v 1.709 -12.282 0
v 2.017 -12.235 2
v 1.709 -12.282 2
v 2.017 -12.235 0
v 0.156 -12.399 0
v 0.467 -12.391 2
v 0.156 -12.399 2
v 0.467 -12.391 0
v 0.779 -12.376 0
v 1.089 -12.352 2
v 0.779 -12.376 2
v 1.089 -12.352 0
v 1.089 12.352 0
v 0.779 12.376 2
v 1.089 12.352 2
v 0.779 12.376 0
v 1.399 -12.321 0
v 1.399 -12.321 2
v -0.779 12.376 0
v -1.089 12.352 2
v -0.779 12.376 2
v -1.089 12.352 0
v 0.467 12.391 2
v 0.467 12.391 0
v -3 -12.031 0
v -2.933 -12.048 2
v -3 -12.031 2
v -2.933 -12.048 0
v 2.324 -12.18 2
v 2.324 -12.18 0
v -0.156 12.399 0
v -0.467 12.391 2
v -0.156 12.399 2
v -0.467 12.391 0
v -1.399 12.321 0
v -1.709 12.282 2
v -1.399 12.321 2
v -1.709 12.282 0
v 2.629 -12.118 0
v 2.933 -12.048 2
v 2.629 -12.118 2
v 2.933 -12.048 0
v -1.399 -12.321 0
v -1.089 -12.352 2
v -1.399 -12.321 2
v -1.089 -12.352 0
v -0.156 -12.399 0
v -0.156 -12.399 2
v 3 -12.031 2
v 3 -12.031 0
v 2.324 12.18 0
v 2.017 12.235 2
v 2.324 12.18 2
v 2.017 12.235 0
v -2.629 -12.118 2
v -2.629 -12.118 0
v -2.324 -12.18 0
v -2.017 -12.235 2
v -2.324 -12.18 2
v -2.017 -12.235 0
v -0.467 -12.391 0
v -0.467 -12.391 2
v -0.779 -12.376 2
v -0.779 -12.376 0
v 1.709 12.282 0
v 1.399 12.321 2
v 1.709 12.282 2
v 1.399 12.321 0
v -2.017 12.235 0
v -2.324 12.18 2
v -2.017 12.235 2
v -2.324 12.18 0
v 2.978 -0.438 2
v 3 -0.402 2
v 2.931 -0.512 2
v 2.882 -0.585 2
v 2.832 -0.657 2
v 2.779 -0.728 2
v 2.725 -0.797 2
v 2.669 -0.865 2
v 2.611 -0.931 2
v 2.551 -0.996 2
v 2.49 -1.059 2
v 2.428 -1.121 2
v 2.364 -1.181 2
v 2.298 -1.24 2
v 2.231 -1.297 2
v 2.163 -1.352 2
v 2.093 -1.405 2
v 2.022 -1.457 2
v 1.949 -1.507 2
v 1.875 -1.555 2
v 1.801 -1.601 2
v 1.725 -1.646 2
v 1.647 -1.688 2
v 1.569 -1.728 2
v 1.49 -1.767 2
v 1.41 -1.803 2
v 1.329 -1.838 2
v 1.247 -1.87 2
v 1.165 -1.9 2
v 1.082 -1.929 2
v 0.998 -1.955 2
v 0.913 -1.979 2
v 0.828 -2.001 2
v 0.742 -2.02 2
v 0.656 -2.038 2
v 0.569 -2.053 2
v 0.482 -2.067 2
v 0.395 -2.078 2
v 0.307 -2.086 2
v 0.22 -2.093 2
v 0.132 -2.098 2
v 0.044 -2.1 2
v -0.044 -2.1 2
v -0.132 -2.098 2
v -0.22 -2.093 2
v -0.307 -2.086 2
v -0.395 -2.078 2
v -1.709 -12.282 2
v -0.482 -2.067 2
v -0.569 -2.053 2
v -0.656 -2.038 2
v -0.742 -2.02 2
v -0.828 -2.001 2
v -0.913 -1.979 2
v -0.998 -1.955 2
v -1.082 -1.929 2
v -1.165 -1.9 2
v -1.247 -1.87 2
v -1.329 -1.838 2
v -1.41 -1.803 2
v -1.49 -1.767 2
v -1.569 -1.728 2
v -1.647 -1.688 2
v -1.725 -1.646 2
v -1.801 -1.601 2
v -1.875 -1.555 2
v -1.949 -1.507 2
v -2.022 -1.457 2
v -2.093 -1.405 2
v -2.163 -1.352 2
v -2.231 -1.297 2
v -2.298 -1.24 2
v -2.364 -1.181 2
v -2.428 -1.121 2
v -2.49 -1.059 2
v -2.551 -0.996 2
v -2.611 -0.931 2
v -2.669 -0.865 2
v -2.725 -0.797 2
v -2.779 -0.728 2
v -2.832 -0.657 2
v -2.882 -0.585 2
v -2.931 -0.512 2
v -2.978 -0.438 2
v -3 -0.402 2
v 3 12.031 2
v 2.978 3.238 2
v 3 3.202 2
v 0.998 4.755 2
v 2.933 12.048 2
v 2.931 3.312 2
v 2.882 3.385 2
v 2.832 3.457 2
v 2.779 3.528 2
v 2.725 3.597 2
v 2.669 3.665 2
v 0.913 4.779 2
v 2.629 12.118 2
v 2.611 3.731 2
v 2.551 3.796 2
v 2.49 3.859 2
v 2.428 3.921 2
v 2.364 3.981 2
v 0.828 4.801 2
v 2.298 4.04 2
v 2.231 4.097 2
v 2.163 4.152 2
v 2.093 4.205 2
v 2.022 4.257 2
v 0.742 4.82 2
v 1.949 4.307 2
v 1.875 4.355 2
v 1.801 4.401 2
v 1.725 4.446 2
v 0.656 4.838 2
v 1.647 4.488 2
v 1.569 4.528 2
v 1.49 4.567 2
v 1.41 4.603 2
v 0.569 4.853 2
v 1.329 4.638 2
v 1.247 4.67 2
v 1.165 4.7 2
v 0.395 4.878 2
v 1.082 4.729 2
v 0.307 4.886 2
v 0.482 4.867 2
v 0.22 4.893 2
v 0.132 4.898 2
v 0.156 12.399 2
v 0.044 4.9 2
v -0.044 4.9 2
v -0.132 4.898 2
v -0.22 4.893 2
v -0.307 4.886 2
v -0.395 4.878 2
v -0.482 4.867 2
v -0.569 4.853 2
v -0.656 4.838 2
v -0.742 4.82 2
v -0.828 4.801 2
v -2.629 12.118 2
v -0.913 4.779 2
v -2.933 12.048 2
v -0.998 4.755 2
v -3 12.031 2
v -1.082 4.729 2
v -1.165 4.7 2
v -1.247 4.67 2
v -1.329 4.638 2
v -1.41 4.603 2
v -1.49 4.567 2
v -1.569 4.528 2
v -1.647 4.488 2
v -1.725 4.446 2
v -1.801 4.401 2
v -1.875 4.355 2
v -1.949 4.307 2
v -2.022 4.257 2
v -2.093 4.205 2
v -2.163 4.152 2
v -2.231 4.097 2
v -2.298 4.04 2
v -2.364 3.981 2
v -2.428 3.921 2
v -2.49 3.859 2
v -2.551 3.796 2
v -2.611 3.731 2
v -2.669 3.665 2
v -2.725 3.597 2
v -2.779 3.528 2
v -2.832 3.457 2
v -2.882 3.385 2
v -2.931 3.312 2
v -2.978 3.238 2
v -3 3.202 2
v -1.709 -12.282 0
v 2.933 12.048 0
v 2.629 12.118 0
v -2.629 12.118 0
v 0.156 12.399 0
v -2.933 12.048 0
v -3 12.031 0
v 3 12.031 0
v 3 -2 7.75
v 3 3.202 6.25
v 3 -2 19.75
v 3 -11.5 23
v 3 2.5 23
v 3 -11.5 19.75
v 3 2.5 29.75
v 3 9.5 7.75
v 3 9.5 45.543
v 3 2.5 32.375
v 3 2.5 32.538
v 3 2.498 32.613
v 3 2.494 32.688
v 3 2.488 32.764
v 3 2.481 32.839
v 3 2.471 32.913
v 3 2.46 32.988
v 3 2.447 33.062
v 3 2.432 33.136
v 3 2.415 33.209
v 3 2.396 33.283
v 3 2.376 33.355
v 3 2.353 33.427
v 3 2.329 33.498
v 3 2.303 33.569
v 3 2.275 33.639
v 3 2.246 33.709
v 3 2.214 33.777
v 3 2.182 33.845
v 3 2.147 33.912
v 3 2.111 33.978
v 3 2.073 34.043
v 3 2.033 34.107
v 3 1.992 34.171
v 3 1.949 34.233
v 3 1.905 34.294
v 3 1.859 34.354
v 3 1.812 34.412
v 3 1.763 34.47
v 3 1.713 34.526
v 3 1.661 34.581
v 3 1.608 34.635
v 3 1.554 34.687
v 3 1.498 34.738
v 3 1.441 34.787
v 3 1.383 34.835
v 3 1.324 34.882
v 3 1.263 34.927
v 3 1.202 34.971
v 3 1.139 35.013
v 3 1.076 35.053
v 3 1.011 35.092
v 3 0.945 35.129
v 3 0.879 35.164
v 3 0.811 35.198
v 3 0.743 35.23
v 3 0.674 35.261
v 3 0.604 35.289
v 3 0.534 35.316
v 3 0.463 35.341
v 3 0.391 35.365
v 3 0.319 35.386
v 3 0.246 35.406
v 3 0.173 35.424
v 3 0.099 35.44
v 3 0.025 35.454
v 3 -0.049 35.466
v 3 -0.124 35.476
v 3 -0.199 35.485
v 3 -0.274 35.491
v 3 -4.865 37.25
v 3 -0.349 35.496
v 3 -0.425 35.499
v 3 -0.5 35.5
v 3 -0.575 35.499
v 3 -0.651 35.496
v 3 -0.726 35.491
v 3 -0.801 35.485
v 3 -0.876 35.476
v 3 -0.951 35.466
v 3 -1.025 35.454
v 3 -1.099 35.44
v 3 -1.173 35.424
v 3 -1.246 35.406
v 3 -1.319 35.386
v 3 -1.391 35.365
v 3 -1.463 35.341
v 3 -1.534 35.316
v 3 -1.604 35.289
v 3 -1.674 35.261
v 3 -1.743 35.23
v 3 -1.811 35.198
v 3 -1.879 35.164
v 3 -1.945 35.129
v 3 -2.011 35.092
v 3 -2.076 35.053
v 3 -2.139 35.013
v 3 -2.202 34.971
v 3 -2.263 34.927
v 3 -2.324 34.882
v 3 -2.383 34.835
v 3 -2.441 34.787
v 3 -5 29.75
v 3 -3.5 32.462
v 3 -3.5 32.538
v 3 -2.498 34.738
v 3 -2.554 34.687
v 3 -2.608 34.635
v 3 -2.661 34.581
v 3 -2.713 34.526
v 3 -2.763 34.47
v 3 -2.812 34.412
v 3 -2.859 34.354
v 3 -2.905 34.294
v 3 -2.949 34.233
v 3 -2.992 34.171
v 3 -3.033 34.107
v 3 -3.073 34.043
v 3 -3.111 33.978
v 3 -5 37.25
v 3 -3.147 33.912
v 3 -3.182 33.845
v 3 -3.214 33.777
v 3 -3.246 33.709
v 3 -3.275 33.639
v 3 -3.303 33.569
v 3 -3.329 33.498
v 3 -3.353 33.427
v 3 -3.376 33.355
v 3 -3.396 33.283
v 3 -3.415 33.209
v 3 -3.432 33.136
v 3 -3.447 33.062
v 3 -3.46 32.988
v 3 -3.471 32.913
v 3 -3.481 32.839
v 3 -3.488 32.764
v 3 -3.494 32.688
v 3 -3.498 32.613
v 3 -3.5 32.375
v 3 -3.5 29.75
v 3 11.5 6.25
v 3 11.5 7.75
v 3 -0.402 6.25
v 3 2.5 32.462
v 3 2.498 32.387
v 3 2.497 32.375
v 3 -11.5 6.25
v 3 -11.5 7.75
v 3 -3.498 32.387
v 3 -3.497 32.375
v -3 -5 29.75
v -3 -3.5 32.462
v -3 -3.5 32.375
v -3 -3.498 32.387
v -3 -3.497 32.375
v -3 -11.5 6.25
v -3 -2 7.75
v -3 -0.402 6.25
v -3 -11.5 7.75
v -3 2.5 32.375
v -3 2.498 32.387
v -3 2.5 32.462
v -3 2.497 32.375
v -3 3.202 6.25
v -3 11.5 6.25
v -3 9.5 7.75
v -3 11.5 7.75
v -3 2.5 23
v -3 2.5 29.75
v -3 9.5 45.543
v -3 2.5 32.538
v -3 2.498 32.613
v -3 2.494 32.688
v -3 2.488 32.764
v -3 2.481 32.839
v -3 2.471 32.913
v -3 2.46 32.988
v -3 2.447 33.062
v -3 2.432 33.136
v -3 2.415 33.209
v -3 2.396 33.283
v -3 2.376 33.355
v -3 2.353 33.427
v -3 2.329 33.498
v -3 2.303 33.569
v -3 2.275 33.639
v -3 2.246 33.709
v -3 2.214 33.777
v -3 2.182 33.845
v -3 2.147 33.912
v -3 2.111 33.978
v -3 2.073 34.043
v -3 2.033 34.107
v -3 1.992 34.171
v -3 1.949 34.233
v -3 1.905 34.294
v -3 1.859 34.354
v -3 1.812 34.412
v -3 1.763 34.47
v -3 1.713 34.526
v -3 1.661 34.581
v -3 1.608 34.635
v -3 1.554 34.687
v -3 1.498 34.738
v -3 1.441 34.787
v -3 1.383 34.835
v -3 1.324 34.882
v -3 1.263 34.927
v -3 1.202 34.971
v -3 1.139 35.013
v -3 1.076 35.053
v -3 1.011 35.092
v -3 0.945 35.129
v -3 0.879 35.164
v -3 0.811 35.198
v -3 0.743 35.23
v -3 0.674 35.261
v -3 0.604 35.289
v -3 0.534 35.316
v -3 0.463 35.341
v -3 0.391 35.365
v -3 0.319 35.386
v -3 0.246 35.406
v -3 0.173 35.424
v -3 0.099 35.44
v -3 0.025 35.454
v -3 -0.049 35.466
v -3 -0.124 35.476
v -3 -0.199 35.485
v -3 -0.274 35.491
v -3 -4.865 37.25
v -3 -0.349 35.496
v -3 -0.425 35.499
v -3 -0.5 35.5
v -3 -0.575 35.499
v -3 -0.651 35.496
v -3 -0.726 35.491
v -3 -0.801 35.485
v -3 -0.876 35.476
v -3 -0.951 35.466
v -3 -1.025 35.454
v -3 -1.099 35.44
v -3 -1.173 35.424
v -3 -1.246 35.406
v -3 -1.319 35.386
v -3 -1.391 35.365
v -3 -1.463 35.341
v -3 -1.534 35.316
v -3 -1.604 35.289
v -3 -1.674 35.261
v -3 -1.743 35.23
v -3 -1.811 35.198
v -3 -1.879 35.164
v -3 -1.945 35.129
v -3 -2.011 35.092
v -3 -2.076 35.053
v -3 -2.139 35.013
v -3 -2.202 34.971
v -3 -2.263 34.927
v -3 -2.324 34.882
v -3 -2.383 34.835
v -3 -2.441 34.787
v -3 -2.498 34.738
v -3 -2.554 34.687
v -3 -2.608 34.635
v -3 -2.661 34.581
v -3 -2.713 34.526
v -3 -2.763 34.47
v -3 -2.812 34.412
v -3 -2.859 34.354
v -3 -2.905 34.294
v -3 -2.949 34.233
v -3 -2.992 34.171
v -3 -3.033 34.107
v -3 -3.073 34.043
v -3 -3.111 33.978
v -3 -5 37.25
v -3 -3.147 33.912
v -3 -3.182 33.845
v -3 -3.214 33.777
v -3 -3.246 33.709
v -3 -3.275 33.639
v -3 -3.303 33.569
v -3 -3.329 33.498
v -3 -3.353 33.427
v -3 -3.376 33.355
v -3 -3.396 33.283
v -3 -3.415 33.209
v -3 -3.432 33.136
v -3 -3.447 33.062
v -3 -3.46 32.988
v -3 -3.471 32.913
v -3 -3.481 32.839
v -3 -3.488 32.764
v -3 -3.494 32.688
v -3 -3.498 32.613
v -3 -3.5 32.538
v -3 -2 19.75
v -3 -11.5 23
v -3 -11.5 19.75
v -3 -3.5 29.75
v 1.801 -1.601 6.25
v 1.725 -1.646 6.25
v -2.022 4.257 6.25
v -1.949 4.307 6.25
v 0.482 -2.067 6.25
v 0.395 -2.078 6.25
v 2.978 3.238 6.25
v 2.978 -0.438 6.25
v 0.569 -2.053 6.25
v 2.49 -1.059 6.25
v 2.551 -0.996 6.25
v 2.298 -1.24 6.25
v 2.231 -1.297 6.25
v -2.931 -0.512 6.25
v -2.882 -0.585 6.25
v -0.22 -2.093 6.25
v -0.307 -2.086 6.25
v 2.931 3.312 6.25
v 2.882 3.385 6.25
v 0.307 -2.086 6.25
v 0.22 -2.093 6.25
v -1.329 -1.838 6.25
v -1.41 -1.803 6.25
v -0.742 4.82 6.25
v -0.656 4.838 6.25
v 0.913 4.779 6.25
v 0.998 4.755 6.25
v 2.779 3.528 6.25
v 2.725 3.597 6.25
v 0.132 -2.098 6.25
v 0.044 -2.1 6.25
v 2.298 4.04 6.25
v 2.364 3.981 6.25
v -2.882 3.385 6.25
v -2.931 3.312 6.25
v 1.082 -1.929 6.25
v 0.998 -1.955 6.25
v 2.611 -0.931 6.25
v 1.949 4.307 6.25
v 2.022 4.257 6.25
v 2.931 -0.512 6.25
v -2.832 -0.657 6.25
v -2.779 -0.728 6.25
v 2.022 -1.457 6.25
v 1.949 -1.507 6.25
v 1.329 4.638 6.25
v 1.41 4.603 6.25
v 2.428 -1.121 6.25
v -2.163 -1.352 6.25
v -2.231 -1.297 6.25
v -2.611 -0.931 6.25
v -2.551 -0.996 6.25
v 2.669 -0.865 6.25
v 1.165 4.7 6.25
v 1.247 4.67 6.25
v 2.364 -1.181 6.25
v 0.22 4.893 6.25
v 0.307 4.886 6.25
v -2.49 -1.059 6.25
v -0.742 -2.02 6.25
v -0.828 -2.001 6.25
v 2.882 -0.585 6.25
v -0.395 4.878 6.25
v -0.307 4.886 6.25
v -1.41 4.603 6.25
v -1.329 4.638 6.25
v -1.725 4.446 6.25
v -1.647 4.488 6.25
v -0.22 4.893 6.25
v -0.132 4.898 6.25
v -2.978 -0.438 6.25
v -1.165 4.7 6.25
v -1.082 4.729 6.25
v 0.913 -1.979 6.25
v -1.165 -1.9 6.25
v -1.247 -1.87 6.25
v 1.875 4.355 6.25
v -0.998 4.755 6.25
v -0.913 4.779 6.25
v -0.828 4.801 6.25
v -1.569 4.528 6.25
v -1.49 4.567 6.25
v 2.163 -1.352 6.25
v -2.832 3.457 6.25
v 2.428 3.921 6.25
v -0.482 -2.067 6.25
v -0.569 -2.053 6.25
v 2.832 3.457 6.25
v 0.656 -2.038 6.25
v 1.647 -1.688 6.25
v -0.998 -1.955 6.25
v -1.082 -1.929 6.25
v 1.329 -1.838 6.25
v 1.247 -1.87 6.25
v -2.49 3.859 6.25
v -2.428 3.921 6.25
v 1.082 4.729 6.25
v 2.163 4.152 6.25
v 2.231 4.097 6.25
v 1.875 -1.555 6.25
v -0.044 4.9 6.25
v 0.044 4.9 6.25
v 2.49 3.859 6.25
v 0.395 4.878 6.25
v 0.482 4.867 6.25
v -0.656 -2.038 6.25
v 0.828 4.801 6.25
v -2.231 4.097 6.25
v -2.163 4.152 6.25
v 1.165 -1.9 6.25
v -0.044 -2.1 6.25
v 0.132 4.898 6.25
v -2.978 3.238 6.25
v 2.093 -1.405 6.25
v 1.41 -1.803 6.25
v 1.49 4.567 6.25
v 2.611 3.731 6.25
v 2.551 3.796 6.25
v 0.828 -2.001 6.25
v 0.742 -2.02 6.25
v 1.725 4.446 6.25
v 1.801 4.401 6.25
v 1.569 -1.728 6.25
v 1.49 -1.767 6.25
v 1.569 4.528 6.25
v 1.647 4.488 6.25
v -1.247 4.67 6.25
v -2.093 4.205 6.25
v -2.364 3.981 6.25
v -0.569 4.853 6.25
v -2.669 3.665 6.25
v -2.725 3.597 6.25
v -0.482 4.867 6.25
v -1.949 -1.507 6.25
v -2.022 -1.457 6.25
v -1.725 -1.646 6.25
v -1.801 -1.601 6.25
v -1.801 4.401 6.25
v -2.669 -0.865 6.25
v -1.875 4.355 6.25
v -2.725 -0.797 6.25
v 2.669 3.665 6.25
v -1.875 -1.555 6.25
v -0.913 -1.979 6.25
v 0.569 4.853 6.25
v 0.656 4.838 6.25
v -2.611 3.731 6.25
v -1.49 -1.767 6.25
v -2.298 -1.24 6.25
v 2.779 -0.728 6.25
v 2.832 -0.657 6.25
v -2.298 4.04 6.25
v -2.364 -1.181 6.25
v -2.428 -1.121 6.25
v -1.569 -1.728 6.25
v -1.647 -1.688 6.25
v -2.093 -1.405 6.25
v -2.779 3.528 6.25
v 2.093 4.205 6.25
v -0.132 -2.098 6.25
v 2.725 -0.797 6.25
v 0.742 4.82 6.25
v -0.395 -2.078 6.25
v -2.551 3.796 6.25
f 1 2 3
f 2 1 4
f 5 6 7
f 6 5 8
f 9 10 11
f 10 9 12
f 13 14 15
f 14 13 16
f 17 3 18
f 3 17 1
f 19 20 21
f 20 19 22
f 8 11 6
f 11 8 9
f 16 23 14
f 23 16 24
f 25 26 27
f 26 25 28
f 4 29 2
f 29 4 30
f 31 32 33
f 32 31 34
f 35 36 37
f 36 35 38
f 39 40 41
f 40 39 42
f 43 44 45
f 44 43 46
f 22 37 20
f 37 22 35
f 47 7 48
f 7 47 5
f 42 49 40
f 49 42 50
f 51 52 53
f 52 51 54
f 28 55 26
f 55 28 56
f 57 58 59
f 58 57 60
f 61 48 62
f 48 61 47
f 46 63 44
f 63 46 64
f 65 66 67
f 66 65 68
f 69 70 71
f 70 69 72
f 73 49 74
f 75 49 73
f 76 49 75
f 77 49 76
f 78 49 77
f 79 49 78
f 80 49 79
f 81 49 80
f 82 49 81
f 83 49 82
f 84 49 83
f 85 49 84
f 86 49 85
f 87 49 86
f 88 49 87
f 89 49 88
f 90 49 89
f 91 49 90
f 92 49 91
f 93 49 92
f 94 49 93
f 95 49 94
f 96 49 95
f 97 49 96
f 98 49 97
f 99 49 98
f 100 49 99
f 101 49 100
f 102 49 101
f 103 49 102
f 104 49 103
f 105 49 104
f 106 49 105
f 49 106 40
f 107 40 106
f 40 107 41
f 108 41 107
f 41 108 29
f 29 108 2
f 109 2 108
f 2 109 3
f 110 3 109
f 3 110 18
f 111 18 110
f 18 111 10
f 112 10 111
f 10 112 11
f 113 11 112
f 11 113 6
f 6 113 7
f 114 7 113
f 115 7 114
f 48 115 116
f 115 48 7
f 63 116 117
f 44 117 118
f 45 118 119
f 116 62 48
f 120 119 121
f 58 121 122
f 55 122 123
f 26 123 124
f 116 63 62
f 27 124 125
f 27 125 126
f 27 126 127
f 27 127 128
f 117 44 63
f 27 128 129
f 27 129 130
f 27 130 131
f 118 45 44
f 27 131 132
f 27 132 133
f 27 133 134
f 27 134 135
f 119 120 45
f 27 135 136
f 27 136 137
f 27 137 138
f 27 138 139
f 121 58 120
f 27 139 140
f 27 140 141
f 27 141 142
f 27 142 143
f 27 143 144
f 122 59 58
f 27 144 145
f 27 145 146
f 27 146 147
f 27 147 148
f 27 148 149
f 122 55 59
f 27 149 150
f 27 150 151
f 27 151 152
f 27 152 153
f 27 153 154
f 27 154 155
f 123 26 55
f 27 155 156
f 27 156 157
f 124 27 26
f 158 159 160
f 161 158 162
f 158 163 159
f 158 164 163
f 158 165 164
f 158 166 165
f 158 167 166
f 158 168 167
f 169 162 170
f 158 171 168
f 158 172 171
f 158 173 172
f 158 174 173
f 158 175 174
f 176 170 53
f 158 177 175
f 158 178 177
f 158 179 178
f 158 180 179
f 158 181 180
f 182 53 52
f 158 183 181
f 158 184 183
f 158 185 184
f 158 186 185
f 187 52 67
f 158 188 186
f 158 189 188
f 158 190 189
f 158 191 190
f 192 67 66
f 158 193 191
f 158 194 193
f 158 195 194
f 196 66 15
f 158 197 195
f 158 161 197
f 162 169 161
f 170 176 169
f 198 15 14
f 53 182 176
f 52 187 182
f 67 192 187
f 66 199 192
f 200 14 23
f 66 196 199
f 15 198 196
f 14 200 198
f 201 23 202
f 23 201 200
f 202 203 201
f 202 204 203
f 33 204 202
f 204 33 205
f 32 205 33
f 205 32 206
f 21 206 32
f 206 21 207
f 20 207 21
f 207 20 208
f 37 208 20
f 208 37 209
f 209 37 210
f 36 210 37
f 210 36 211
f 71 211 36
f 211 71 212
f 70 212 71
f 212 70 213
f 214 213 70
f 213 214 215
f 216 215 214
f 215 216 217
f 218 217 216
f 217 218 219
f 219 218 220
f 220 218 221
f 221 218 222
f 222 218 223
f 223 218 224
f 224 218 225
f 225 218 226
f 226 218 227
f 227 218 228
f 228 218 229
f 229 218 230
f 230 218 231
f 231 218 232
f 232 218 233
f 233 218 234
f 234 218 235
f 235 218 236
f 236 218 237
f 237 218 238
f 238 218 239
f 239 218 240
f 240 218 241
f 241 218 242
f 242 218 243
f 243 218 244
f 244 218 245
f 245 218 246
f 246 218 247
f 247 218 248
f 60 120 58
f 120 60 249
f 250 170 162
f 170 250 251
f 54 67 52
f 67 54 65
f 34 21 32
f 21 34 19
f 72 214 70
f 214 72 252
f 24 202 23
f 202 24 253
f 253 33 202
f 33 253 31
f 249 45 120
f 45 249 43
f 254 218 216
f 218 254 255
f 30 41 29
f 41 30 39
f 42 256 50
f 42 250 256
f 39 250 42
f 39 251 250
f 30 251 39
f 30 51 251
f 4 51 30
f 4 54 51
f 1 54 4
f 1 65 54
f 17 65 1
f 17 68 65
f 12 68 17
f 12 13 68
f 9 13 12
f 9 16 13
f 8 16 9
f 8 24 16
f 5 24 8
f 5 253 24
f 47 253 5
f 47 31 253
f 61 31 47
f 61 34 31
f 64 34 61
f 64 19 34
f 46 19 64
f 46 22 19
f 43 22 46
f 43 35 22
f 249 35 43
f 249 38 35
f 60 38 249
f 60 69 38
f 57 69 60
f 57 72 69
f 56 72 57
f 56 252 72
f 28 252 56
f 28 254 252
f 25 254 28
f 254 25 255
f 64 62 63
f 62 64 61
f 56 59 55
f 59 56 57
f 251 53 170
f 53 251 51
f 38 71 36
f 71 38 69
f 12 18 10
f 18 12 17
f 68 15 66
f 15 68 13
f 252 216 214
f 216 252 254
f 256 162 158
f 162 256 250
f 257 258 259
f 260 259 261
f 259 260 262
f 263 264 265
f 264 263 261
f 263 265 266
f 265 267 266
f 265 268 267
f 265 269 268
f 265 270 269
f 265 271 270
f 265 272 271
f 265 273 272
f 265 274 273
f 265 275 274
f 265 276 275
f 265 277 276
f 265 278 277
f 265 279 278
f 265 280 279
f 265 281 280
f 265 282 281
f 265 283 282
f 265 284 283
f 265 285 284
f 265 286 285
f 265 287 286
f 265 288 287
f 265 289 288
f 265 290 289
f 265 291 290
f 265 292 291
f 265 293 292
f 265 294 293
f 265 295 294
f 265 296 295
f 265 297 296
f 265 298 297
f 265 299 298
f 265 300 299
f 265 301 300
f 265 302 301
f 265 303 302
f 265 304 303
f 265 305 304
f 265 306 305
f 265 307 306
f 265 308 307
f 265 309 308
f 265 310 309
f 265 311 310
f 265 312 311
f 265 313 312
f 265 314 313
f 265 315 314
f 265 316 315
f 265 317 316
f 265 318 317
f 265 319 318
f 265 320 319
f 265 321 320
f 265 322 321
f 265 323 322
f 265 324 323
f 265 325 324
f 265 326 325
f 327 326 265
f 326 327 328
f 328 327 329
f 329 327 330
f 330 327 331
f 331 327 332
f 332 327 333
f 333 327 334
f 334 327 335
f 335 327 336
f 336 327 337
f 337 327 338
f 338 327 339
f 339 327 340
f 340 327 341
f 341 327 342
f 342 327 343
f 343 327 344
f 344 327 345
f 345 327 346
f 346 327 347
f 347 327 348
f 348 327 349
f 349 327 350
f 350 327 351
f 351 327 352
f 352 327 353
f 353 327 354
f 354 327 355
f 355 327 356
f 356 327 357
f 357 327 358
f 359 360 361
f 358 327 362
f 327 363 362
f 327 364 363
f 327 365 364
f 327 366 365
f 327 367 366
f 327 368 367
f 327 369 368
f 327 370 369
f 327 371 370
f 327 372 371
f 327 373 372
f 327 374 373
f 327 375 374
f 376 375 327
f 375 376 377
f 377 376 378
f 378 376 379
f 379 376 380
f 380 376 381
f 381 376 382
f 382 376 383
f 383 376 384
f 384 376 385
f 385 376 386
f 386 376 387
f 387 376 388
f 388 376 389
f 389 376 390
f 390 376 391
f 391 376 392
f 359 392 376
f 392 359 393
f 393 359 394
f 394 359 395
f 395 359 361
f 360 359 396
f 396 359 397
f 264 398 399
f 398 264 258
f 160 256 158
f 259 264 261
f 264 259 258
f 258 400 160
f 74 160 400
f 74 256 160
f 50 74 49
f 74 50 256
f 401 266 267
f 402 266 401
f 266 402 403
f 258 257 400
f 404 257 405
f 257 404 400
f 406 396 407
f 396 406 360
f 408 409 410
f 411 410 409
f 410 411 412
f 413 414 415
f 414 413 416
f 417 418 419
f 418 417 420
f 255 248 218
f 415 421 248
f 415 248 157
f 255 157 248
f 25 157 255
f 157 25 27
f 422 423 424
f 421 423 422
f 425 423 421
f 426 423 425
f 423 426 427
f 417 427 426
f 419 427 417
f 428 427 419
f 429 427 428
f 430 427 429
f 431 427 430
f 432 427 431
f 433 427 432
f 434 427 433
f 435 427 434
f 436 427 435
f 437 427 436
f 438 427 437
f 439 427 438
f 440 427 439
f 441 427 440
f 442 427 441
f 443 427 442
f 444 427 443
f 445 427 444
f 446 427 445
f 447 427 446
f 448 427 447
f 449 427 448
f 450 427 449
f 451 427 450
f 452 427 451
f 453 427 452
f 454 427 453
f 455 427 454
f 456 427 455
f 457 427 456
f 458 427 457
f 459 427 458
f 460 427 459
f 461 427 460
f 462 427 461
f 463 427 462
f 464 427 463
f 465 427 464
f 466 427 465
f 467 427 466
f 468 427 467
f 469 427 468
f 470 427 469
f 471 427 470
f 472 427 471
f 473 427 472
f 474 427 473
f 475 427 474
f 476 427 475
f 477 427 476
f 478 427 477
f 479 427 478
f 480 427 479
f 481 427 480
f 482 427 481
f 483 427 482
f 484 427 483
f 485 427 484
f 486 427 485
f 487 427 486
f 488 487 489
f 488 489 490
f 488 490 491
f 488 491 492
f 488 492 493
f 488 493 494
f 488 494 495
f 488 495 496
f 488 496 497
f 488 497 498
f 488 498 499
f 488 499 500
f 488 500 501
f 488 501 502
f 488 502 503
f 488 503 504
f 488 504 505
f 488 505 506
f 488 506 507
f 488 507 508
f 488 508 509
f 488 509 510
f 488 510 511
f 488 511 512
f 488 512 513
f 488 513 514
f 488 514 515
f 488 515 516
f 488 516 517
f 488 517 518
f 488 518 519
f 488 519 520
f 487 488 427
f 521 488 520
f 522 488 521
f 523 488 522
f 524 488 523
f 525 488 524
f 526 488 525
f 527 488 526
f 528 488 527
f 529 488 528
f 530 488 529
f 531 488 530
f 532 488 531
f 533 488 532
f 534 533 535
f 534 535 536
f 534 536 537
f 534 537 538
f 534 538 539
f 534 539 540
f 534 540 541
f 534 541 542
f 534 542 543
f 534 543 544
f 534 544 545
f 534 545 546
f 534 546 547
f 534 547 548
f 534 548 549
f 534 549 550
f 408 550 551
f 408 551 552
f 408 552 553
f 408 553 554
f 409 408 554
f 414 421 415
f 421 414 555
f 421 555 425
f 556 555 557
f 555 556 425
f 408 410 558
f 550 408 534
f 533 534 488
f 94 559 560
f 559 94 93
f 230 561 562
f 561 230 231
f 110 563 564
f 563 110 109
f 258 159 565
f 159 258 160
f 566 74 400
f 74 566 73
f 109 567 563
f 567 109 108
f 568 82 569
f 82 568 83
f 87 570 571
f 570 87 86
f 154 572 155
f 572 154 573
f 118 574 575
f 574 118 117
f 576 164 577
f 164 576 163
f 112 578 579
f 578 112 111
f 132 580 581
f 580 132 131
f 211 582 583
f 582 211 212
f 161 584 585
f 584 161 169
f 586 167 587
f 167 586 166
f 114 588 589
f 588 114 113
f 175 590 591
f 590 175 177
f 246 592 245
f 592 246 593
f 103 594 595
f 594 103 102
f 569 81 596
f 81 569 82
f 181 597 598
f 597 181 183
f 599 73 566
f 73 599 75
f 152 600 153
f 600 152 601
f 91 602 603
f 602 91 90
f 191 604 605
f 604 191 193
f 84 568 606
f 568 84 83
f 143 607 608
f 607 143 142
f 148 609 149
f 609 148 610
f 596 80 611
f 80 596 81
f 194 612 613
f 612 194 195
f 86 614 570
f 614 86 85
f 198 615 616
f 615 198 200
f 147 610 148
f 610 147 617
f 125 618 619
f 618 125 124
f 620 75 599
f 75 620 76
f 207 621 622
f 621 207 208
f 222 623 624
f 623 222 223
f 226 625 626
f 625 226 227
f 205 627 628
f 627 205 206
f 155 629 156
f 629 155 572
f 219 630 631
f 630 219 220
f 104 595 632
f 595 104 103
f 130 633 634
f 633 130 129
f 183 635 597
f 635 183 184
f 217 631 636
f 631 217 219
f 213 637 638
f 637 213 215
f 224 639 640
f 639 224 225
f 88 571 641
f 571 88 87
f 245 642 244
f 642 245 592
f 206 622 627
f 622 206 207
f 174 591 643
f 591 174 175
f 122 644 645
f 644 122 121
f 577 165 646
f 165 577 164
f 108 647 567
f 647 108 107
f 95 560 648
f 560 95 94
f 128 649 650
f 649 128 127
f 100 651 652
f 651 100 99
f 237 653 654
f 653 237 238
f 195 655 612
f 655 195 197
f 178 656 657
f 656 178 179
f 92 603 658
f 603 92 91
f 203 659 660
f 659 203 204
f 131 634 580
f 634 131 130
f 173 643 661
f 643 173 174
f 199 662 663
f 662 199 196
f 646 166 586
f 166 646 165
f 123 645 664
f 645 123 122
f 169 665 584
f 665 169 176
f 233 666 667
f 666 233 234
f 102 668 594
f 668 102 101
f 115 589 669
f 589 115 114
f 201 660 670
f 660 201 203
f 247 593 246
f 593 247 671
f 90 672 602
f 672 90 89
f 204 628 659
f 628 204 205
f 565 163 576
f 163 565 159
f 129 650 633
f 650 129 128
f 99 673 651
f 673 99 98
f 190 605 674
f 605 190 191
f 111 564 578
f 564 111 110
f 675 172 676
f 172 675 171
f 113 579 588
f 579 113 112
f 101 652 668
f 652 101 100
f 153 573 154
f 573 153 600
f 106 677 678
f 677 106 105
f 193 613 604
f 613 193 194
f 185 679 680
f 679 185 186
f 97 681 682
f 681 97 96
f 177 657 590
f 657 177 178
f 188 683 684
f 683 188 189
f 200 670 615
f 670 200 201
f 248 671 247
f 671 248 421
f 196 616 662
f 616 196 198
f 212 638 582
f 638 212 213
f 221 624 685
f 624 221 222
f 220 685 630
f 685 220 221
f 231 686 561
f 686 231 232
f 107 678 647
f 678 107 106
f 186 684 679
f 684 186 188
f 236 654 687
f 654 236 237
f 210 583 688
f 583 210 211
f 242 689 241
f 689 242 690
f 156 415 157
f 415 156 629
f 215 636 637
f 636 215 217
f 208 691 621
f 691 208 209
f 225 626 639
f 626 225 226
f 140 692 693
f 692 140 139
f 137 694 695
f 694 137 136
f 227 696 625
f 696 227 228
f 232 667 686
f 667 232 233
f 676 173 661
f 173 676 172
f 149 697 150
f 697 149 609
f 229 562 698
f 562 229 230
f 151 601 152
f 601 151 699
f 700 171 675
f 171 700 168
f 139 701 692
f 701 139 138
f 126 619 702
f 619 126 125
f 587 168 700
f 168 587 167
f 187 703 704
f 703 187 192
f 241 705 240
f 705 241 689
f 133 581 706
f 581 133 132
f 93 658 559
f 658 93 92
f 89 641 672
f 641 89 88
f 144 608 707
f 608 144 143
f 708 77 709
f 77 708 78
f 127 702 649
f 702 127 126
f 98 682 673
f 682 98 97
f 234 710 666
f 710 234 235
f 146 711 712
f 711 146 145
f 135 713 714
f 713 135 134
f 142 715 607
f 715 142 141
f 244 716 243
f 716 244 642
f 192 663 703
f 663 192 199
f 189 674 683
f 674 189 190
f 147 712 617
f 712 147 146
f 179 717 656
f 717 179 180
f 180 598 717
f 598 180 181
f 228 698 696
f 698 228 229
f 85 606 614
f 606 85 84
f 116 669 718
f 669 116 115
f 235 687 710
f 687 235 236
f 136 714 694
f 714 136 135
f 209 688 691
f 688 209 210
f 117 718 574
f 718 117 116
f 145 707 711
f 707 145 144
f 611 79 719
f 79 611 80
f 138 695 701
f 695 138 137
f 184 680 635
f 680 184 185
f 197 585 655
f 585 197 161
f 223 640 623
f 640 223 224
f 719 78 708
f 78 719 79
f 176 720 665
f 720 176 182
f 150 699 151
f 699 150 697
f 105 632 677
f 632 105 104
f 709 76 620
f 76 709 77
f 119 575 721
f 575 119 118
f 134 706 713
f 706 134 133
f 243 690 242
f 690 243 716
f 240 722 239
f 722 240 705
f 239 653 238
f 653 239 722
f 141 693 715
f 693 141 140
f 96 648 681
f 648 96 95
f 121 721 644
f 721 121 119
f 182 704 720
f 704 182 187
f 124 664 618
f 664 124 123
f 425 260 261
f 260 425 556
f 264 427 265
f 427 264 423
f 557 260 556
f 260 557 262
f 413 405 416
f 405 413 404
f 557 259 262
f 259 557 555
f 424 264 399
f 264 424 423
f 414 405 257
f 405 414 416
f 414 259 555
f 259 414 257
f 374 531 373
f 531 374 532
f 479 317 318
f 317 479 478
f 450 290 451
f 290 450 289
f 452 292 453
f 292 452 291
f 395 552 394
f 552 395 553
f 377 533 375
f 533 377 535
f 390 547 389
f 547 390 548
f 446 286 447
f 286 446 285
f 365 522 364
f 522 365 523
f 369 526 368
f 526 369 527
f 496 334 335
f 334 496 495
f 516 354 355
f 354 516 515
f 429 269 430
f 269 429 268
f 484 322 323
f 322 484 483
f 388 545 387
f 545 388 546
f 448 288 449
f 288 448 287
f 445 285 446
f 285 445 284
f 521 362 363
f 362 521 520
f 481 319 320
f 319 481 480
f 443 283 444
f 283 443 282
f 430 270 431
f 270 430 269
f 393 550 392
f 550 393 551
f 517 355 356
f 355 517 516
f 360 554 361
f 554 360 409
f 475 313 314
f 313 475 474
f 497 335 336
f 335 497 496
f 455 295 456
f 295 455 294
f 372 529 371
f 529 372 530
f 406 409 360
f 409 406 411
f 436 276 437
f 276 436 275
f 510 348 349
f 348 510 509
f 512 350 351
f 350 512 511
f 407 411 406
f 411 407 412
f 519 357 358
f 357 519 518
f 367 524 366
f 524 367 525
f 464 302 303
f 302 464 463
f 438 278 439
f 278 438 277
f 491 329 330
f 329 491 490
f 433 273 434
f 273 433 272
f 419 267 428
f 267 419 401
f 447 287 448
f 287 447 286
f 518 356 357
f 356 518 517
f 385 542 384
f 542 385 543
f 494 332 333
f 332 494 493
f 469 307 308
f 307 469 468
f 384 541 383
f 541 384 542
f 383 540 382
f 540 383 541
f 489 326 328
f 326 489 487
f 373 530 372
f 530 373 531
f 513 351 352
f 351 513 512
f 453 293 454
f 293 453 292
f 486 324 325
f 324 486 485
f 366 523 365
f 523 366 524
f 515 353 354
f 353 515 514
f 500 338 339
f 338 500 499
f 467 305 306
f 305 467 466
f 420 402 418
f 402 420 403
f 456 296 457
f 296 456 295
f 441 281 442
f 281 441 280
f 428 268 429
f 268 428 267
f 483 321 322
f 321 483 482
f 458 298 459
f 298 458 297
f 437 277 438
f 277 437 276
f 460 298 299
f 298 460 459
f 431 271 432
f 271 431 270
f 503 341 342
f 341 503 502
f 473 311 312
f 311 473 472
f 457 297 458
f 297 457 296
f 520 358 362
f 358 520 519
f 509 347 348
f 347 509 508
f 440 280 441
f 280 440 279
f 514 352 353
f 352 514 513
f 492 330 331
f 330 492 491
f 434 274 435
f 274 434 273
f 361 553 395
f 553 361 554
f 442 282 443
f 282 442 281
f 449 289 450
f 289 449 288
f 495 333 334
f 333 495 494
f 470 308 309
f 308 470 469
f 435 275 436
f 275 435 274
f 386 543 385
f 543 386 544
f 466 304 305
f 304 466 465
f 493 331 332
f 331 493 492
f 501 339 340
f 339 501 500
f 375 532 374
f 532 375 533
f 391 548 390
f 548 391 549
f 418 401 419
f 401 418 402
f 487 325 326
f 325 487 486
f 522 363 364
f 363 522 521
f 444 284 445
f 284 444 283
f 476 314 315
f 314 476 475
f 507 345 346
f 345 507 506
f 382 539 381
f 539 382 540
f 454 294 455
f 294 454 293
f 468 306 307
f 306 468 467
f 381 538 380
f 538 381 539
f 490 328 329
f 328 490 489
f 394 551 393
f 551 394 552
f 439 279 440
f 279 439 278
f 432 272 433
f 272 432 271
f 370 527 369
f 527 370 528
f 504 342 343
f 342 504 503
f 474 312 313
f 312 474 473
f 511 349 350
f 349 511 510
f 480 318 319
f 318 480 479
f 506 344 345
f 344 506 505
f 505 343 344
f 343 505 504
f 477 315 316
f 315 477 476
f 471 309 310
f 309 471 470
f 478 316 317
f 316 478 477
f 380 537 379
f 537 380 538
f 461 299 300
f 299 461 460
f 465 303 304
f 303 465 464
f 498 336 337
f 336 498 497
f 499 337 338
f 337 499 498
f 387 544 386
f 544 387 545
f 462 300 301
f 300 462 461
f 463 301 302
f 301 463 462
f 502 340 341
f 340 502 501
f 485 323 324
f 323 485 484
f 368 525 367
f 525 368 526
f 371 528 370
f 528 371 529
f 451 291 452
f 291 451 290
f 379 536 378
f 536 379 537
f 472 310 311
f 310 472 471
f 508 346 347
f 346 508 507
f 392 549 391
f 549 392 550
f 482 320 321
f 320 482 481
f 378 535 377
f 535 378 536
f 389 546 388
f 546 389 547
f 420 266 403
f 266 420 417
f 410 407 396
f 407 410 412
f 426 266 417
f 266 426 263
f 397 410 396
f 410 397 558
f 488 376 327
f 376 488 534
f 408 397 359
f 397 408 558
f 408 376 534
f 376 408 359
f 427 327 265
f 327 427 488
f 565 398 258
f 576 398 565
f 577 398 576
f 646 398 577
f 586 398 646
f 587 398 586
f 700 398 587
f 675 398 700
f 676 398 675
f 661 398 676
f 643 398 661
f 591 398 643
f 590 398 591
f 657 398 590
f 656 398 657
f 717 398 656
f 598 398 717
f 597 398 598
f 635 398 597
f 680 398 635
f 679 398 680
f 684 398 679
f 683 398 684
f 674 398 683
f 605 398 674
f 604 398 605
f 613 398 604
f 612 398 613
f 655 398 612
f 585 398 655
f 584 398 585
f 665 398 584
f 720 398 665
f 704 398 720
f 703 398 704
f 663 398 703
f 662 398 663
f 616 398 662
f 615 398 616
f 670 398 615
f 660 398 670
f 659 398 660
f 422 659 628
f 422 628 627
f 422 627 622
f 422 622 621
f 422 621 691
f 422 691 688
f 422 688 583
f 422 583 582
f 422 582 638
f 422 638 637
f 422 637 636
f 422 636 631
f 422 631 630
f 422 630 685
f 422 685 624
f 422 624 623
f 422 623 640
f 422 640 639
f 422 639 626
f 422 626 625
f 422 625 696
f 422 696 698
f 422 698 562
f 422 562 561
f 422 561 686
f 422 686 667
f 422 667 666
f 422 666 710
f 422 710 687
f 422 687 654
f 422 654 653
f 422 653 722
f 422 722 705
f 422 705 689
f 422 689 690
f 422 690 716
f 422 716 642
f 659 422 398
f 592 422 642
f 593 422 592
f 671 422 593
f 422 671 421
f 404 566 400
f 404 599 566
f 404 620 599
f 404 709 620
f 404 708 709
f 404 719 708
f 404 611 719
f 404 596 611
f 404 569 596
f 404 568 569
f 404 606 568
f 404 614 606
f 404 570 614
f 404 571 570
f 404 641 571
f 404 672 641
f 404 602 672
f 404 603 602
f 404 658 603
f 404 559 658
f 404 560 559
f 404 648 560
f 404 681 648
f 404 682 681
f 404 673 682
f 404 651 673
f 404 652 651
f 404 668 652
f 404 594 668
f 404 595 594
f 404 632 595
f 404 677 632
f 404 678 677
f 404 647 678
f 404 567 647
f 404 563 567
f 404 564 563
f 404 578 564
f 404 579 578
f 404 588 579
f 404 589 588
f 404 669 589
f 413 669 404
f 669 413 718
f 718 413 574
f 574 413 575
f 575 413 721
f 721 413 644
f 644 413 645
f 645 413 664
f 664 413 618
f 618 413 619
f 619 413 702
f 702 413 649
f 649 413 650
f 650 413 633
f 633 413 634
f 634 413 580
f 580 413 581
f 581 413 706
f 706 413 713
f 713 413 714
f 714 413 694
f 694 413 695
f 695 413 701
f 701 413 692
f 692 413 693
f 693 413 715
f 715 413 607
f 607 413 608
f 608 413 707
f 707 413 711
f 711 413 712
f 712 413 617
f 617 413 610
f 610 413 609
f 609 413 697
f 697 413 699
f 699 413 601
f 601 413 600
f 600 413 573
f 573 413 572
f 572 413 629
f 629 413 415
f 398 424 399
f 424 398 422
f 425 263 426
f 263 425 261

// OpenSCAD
fn=50;
translate([0,0,1]) {
    intersection() {
        br=24.8;
        h=2;
        cylinder(h, br/2, br/2, true, $fn=fn*5);
        cube([6, br, h], true);
    }
}

of = (24.8 /2) - 7.5 - 3.5;
translate([0,of,4.25]) {
    intersection() {
        br=7;
        h=4.5;
        cylinder(h, br/2, br/2, true, $fn=fn*5);
        cube([6, br, h], true);
    }
}

translate([0,0,7]) {
        cube([6, 23, 1.5], true);
}

translate([0,-1,6.5+(16.5/2)]) {
     difference() {
        cube([6, 21, 16.5], true);
        translate([0, -6, -1]) cube([8.5, 10, 12], true);
     }
}

translate([0, 6,6.5 +16.5 + (6.75 / 2)]) {
    cube([6, 7, 6.75], true);
}

translate([0, 2.25,6.5 +16.5 + 6.75 + (7.5 /2) ]) {
    difference() {
        cube([6, 14.5, 7.5], true);
        br=6;
        translate([0, -2.75, -1]) {
            rotate([0, 90 ,0]) {
                cylinder(8.5, br/2, br/2, true, $fn=fn*5);
            }
            translate([0, 0, -1.5]) 
                cube([8.5, br, 2.75], true);
        }
    }
}


translate([0, 2.25,6.5 +16.5 + 6.75 + 7.5 +5]) {
    difference() {
        cube([6, 14.5, 10], true);
        translate([0,-2,9.5]) 
            rotate ([30,0,0])
                cube([8.5, 30, 20], true);
    }
}
